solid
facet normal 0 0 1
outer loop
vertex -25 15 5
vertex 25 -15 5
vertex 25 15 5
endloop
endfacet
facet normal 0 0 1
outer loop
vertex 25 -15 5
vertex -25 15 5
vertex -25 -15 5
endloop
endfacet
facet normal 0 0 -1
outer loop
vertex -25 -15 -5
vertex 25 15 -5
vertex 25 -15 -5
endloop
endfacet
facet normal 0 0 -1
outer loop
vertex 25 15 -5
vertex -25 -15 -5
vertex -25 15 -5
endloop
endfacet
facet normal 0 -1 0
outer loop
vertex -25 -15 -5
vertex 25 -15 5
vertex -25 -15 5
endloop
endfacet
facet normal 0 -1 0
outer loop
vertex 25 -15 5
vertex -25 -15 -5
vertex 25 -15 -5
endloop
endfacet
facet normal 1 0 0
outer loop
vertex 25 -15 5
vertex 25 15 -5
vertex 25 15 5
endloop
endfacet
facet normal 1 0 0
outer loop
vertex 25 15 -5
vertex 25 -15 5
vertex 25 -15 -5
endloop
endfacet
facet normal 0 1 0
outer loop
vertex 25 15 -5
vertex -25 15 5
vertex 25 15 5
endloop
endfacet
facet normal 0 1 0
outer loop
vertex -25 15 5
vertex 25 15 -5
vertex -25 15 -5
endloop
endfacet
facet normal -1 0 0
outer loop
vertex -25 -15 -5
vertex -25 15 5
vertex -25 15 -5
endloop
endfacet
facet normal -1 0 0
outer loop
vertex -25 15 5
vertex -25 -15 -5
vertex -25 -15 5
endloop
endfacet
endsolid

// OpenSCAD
// Parameters
body_length = 50; //[25:100:1]
body_width = 30; //[15:60:1]
body_height = 10; //[5:20:1]

// Main Body
module main_body() {
  color([0.85, 0.85, 0.8]) // Off-white for 3D printed PLA
  translate([0, 0, 0]) // Centered at origin
    cube([body_length, body_width, body_height], center=true);
}

// Final Model
union() {
  main_body();
}
